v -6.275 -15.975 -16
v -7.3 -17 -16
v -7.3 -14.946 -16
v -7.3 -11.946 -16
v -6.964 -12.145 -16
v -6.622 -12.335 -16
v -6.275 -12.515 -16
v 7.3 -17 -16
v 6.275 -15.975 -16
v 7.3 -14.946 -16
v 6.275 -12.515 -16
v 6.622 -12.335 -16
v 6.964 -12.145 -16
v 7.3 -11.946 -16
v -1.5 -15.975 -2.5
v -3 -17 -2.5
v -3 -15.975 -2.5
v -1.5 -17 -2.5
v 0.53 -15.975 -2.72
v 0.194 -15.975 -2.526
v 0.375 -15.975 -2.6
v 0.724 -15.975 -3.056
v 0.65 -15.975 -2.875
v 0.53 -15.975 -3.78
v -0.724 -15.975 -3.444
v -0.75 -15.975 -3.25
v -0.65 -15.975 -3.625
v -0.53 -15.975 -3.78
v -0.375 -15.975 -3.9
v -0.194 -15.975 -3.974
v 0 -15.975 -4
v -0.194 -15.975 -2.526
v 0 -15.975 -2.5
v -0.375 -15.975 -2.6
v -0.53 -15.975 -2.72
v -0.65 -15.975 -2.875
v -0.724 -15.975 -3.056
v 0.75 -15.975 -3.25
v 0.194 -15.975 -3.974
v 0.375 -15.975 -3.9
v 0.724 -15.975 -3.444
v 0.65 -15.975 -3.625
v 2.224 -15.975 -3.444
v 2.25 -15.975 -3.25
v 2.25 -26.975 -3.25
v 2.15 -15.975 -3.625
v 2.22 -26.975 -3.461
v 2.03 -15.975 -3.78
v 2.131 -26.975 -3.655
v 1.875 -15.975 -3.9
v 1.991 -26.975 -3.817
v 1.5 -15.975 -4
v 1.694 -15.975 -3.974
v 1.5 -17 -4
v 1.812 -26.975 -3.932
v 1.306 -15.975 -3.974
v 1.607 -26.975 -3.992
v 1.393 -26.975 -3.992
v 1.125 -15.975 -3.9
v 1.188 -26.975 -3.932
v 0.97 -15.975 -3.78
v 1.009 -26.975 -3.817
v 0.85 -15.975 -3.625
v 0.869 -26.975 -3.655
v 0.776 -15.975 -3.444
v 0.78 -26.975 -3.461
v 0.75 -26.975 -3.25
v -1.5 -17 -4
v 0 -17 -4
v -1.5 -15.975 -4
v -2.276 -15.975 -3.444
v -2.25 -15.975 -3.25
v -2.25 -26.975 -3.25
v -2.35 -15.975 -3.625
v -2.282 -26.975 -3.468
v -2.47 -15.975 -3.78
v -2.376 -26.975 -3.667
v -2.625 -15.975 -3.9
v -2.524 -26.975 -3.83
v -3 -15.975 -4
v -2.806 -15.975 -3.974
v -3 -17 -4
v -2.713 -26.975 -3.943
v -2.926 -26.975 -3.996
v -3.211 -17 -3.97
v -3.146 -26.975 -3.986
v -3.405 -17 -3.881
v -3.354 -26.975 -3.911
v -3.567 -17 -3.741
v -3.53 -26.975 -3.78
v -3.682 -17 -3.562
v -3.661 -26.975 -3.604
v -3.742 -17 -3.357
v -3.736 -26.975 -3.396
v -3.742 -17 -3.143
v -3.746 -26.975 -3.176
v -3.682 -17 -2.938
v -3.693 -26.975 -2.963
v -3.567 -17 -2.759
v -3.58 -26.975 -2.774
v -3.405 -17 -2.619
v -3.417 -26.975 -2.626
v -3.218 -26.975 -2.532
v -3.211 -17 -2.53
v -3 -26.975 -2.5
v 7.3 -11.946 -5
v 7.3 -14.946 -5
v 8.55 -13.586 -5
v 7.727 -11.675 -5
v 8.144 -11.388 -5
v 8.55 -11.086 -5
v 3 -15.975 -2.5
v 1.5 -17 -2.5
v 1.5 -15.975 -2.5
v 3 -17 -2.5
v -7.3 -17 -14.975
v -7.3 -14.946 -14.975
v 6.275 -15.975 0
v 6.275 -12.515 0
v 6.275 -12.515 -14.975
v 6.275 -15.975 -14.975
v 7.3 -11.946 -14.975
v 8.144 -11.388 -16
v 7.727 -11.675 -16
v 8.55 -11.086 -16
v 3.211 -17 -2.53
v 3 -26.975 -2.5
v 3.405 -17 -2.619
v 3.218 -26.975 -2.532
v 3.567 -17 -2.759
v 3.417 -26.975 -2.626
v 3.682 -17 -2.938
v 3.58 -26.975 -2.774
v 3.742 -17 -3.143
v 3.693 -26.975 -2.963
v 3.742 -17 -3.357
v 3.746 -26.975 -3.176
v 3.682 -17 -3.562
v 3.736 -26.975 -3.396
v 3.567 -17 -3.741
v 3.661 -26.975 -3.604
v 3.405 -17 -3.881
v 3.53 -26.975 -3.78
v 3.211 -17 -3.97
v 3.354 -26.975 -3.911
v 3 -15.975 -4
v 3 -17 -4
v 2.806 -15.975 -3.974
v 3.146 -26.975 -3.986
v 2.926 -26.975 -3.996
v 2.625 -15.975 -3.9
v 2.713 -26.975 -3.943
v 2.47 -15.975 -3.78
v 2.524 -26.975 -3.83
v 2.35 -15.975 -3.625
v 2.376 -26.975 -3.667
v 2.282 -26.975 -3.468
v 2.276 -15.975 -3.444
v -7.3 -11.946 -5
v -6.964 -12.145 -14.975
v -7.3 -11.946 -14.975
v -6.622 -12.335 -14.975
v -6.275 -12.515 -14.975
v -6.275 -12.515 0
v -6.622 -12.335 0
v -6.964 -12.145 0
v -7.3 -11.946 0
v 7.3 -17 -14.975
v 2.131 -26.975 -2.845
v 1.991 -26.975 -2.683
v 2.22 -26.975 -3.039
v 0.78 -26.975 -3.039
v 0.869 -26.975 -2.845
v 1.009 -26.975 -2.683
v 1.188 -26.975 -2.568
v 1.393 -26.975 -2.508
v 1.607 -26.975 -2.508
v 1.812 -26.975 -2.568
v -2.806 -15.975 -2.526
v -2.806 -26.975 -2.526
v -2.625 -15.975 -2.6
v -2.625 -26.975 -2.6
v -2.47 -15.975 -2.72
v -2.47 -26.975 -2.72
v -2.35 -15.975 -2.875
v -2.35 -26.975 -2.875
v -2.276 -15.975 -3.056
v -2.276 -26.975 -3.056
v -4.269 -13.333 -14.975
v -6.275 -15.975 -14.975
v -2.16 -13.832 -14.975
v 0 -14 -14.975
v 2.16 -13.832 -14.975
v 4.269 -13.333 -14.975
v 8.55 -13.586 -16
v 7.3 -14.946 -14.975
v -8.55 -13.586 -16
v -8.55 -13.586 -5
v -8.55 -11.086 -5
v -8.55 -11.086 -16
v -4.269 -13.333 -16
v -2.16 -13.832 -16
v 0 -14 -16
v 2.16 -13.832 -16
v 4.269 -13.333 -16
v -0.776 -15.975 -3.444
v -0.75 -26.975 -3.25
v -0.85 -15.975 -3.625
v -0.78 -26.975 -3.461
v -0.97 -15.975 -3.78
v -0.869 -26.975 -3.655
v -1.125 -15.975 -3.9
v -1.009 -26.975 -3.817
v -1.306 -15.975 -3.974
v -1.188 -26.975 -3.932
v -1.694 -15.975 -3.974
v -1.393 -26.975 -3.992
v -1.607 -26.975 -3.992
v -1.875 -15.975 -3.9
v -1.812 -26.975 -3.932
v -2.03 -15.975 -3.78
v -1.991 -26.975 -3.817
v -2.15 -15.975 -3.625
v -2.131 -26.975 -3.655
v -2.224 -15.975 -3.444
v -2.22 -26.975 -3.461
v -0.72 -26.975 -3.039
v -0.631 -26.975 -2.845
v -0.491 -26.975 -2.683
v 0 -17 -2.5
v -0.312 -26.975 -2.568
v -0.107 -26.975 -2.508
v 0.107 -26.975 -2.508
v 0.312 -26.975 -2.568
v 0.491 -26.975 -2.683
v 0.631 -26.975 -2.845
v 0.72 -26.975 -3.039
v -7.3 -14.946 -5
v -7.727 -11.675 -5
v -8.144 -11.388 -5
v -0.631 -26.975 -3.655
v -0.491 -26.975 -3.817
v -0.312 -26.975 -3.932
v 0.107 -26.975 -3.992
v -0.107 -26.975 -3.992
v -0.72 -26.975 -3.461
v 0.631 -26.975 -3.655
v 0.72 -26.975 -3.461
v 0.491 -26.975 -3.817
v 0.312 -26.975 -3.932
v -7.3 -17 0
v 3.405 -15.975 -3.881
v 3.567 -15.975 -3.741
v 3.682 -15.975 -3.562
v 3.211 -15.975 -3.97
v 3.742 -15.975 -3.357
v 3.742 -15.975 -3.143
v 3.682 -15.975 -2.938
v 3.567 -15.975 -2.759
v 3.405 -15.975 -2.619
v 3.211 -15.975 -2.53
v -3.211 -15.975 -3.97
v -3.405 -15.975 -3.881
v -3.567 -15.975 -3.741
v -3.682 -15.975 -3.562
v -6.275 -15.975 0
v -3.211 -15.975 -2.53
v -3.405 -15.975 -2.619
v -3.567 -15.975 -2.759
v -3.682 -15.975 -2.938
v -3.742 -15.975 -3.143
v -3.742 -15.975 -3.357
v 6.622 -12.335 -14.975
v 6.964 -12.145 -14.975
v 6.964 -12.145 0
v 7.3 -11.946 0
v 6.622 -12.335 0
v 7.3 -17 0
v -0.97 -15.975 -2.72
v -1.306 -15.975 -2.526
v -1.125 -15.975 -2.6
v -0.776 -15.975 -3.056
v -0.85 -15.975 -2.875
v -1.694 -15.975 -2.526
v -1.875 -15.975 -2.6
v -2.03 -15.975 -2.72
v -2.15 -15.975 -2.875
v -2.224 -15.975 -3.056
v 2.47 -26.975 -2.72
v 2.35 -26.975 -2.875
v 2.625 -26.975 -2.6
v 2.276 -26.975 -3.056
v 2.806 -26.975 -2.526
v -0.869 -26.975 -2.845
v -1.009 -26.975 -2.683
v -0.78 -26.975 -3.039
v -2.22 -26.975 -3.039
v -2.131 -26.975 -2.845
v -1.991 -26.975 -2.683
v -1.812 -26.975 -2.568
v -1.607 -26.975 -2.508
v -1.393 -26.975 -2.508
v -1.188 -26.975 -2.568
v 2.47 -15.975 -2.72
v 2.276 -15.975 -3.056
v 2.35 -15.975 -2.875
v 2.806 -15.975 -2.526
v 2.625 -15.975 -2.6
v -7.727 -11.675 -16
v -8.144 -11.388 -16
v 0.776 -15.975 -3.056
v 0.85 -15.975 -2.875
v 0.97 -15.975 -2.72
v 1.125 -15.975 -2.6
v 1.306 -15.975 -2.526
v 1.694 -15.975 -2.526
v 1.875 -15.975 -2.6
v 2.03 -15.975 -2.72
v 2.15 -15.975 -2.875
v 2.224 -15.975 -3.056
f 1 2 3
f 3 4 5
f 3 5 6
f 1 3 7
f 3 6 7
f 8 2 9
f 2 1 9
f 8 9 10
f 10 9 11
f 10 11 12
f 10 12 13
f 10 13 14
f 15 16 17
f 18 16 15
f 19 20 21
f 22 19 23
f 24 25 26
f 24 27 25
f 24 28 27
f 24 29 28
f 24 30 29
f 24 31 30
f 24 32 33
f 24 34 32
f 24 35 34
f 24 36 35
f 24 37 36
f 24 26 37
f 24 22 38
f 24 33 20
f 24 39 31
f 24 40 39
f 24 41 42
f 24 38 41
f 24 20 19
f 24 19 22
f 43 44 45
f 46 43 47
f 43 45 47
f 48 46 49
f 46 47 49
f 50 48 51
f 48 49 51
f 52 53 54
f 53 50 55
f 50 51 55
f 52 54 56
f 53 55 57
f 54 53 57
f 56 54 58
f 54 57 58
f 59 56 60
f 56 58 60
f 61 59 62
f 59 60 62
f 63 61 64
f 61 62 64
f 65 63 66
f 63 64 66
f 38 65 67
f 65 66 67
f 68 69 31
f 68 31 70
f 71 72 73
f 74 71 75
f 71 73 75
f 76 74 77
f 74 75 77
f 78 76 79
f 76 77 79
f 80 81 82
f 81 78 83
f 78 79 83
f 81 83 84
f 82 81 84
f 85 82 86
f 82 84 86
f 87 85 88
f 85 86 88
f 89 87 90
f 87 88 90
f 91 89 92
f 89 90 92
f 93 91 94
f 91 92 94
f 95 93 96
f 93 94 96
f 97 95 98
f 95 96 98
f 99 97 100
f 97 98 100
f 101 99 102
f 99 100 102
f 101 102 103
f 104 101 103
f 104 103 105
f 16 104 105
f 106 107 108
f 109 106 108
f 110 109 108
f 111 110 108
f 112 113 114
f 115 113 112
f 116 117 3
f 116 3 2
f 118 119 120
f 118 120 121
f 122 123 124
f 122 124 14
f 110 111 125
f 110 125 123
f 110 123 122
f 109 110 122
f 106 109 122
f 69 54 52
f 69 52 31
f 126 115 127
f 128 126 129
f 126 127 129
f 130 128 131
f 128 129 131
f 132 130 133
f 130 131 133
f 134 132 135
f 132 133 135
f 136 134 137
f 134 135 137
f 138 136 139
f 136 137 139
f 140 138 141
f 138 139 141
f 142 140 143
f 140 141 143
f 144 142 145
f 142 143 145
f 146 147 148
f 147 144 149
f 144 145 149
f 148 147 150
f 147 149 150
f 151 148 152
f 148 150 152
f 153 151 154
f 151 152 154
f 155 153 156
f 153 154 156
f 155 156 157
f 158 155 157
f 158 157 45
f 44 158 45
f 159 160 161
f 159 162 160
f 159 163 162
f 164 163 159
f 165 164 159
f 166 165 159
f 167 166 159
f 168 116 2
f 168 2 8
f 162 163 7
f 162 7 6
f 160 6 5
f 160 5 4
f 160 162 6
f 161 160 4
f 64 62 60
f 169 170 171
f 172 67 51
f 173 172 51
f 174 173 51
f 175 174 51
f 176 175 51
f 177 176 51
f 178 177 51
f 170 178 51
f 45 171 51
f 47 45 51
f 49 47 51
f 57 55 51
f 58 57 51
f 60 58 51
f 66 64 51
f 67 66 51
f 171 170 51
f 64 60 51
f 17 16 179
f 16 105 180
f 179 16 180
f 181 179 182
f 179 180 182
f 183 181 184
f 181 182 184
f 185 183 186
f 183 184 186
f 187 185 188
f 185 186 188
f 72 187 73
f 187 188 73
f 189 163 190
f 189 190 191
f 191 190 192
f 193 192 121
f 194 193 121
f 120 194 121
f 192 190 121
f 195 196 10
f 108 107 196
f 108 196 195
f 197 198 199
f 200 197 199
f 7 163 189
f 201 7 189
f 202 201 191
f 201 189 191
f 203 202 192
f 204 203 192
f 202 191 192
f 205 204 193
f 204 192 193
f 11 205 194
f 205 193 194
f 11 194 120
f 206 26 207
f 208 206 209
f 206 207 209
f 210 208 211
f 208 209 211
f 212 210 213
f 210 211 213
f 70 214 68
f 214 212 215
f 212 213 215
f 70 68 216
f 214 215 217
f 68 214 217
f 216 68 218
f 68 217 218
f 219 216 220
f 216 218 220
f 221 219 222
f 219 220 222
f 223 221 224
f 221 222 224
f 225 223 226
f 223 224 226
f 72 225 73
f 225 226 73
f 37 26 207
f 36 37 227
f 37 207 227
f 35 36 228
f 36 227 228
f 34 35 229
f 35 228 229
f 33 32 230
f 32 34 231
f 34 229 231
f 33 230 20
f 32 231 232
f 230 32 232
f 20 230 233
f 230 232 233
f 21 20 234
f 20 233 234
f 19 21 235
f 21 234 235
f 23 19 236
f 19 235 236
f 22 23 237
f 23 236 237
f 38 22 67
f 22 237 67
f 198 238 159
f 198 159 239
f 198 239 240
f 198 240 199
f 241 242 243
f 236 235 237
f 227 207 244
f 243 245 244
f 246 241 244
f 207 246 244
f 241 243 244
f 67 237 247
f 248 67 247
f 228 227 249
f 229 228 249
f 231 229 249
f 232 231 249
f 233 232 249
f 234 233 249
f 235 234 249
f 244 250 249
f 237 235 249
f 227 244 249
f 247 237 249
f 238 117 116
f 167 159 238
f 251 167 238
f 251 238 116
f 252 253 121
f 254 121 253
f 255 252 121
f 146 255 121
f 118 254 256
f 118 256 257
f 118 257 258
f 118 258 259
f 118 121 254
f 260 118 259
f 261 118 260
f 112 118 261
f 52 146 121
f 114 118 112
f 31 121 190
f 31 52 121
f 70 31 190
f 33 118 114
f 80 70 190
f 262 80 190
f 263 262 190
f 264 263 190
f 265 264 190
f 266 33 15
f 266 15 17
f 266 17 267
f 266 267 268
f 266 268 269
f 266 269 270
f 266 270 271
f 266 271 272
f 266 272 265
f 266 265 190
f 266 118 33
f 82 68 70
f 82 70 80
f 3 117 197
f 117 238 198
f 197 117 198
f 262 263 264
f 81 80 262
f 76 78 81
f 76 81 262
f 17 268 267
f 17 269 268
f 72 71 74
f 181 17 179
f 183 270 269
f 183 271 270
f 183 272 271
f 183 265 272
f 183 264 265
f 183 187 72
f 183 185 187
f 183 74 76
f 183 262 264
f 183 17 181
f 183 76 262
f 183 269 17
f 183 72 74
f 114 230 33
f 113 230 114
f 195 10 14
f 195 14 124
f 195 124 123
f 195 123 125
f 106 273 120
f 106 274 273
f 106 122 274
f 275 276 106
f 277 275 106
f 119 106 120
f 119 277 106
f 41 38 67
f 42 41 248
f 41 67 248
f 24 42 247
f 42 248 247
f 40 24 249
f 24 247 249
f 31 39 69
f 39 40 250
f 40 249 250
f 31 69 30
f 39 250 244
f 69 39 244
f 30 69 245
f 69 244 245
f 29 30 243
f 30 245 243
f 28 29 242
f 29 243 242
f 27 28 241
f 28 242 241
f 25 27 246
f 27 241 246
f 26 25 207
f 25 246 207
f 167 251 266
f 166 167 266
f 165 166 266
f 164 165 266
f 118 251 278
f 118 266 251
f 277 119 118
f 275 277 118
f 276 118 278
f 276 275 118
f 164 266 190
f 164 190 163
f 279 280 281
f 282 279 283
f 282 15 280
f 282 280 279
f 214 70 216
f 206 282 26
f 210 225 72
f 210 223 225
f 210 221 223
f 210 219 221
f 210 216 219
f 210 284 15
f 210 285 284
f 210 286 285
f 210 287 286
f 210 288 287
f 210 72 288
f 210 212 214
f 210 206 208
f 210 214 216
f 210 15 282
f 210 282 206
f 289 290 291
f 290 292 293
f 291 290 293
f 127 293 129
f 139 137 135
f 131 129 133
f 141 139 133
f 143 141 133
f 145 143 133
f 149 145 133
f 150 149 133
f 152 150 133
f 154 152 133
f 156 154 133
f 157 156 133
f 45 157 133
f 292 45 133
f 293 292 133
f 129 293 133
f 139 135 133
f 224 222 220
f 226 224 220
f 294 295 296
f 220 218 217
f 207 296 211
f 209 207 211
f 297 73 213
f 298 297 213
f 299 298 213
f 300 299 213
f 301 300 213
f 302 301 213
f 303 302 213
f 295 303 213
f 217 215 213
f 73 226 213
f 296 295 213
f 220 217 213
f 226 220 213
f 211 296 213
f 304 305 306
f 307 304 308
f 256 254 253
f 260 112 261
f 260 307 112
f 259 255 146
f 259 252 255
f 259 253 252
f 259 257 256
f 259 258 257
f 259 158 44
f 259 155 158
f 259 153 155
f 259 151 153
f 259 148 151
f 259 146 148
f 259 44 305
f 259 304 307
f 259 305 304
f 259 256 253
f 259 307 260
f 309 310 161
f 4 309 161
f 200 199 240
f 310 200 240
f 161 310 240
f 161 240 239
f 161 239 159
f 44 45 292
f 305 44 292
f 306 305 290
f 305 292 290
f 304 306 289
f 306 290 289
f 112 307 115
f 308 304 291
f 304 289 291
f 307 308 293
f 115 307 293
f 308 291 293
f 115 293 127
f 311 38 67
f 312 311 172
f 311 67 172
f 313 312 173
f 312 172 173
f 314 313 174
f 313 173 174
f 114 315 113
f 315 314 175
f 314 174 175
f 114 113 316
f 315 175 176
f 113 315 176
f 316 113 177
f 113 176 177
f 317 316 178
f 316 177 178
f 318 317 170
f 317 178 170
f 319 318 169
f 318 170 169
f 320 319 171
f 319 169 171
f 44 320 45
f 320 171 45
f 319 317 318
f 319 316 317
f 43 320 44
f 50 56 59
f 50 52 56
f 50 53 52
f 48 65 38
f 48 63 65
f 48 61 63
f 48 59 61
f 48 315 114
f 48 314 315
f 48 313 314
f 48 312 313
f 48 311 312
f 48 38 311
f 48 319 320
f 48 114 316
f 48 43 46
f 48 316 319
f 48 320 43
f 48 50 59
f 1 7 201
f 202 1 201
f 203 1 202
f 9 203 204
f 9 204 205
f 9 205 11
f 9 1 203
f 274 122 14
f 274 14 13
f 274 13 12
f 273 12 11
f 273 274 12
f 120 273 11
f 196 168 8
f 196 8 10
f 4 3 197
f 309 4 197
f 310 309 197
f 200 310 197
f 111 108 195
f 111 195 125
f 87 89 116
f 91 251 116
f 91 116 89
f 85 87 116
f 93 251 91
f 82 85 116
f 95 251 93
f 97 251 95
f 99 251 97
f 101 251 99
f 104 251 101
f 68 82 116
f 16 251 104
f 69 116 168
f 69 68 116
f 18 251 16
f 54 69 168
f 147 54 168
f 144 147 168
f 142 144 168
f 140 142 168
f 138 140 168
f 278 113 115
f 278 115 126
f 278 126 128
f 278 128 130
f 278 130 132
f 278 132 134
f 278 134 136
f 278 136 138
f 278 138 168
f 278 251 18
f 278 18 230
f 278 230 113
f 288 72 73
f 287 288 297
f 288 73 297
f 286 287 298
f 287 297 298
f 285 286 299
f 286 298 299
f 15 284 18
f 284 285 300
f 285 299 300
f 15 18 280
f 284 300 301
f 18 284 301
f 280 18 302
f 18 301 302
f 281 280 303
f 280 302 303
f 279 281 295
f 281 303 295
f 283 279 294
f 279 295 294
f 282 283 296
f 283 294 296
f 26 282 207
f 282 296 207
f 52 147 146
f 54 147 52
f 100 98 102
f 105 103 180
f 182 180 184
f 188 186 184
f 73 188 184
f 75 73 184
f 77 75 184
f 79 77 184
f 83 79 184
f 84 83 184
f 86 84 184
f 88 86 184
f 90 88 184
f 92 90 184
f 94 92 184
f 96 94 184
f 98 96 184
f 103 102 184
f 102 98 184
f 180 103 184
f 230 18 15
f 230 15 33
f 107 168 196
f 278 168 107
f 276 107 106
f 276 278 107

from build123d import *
from build123d.topology import SkipClean

# Parameters (mm, degrees)
BOSS_EXTRU_1_DEPTH      = 16
BOSS_EXTRU_2_REACH      = 20.298
BOSS_EXTRU_2_END_RADIUS = 14
ESQUISSE2_W             = 14.6
ESQUISSE2_H             = 1.025
BOSS_EXTRU_3_START      = -11
BOSS_EXTRU_3_DEPTH      = 11
ENL_V_MAT_EXTRU_1_DEPTH = 11
BOSS_EXTRU_4_START      = -11
ESQUISSE5_R             = 0.75
BOSS_EXTRU_4_DEPTH      = 11


with BuildPart() as part:
    # Esquisse1 → Boss.-Extru.1 (new body)
    with BuildSketch(Plane.XY):
        with BuildLine():
            Line((-7.3, -17), (7.3, -17))
            Line((7.3, -17), (7.3, -11.94612908))
            ThreePointArc((7.3, -11.94612908), (6.793456419, -12.241280565), (6.275, -12.514966041))
            Line((6.275, -12.514966041), (6.275, -15.975))
            Line((6.275, -15.975), (-6.275, -15.975))
            Line((-6.275, -15.975), (-6.275, -12.514966041))
            ThreePointArc((-6.275, -12.514966041), (-6.793456419, -12.241280565), (-7.3, -11.94612908))
            Line((-7.3, -11.94612908), (-7.3, -17))
        make_face()
    extrude(amount=-BOSS_EXTRU_1_DEPTH)

    # Boss.-Extru.2: up to this cylinder (the profile starts outside it)
    with SkipClean():  # the faces are left unmerged after this step: merging them gives an invalid solid
        boss_extru_2_end = Plane(origin=(0, 0, -15.4875), z_dir=(0, 0, 1)) * Cylinder(BOSS_EXTRU_2_END_RADIUS, 69.596, mode=Mode.PRIVATE)
        # Esquisse2 → Boss.-Extru.2 (add, up to the surface)
        with BuildSketch(Plane.XZ.offset(17), mode=Mode.PRIVATE) as boss_extru_2_sk1:
            with Locations((0, -15.4875)):
                Rectangle(ESQUISSE2_W, ESQUISSE2_H)
        boss_extru_2_tool1 = extrude(boss_extru_2_sk1.sketch, amount=-BOSS_EXTRU_2_REACH, mode=Mode.PRIVATE) - boss_extru_2_end
        add(boss_extru_2_tool1.solids().sort_by_distance((0, -17, -15.4875))[0])

    # Esquisse3 → Boss.-Extru.3 (add)
    with SkipClean():  # the faces are left unmerged after this step: merging them gives an invalid solid
        with BuildSketch(Plane(origin=(0, 0, -16), x_dir=(-1, 0, 0), z_dir=(0, 0, -1)).offset(BOSS_EXTRU_3_START)):
            with BuildLine():
                Line((-7.3, -11.94612908), (-7.3, -14.94612908))
                Line((-7.3, -14.94612908), (-8.55, -13.585914486))
                Line((-8.55, -13.585914486), (-8.55, -11.085914486))
                ThreePointArc((-8.55, -11.085914486), (-7.936662856, -11.53296938), (-7.3, -11.94612908))
            make_face()
            with BuildLine():
                Line((8.55, -13.585914486), (8.55, -11.085914486))
                ThreePointArc((8.55, -11.085914486), (7.936662856, -11.53296938), (7.3, -11.94612908))
                Line((7.3, -11.94612908), (7.3, -14.94612908))
                Line((7.3, -14.94612908), (8.55, -13.585914486))
            make_face()
        extrude(amount=BOSS_EXTRU_3_DEPTH)

    # Esquisse4 → Enlèv. mat.-Extru.1 (cut)
    with SkipClean():  # the faces are left unmerged after this step: merging them gives an invalid solid
        with BuildSketch(Plane.XZ.offset(17)):
            with BuildLine():
                Line((-3, -2.5), (3, -2.5))
                ThreePointArc((3, -2.5), (3.75, -3.25), (3, -4))
                Line((3, -4), (-3, -4))
                ThreePointArc((-3, -4), (-3.75, -3.25), (-3, -2.5))
            make_face()
        extrude(amount=-ENL_V_MAT_EXTRU_1_DEPTH, mode=Mode.SUBTRACT)

    # Esquisse5 → Boss.-Extru.4 (add)
    with SkipClean():  # the faces are left unmerged after this step: merging them gives an invalid solid
        with BuildSketch(Plane(origin=(0, -15.975, 0), x_dir=(1, 0, 0), z_dir=(0, 1, 0)).offset(BOSS_EXTRU_4_START)):
            with BuildLine():
                ThreePointArc((2.25, 3.25), (1.5, 4), (0.75, 3.25))
                ThreePointArc((0.75, 3.25), (1.5, 2.5), (2.25, 3.25))
            make_face()
            with Locations(Location((3, 3.25, 0), (0, 0, 270))):
                Circle(ESQUISSE5_R)
            with Locations(Location((-3, 3.25, 0), (0, 0, 270))):
                Circle(ESQUISSE5_R)
            with BuildLine():
                ThreePointArc((-2.25, 3.25), (-1.5, 2.5), (-0.75, 3.25))
                ThreePointArc((-0.75, 3.25), (-1.5, 4), (-2.25, 3.25))
            make_face()
            with BuildLine():
                ThreePointArc((-0.75, 3.25), (0, 2.5), (0.75, 3.25))
                ThreePointArc((0.75, 3.25), (0, 4), (-0.75, 3.25))
            make_face()
        extrude(amount=BOSS_EXTRU_4_DEPTH)


solid = part.part
